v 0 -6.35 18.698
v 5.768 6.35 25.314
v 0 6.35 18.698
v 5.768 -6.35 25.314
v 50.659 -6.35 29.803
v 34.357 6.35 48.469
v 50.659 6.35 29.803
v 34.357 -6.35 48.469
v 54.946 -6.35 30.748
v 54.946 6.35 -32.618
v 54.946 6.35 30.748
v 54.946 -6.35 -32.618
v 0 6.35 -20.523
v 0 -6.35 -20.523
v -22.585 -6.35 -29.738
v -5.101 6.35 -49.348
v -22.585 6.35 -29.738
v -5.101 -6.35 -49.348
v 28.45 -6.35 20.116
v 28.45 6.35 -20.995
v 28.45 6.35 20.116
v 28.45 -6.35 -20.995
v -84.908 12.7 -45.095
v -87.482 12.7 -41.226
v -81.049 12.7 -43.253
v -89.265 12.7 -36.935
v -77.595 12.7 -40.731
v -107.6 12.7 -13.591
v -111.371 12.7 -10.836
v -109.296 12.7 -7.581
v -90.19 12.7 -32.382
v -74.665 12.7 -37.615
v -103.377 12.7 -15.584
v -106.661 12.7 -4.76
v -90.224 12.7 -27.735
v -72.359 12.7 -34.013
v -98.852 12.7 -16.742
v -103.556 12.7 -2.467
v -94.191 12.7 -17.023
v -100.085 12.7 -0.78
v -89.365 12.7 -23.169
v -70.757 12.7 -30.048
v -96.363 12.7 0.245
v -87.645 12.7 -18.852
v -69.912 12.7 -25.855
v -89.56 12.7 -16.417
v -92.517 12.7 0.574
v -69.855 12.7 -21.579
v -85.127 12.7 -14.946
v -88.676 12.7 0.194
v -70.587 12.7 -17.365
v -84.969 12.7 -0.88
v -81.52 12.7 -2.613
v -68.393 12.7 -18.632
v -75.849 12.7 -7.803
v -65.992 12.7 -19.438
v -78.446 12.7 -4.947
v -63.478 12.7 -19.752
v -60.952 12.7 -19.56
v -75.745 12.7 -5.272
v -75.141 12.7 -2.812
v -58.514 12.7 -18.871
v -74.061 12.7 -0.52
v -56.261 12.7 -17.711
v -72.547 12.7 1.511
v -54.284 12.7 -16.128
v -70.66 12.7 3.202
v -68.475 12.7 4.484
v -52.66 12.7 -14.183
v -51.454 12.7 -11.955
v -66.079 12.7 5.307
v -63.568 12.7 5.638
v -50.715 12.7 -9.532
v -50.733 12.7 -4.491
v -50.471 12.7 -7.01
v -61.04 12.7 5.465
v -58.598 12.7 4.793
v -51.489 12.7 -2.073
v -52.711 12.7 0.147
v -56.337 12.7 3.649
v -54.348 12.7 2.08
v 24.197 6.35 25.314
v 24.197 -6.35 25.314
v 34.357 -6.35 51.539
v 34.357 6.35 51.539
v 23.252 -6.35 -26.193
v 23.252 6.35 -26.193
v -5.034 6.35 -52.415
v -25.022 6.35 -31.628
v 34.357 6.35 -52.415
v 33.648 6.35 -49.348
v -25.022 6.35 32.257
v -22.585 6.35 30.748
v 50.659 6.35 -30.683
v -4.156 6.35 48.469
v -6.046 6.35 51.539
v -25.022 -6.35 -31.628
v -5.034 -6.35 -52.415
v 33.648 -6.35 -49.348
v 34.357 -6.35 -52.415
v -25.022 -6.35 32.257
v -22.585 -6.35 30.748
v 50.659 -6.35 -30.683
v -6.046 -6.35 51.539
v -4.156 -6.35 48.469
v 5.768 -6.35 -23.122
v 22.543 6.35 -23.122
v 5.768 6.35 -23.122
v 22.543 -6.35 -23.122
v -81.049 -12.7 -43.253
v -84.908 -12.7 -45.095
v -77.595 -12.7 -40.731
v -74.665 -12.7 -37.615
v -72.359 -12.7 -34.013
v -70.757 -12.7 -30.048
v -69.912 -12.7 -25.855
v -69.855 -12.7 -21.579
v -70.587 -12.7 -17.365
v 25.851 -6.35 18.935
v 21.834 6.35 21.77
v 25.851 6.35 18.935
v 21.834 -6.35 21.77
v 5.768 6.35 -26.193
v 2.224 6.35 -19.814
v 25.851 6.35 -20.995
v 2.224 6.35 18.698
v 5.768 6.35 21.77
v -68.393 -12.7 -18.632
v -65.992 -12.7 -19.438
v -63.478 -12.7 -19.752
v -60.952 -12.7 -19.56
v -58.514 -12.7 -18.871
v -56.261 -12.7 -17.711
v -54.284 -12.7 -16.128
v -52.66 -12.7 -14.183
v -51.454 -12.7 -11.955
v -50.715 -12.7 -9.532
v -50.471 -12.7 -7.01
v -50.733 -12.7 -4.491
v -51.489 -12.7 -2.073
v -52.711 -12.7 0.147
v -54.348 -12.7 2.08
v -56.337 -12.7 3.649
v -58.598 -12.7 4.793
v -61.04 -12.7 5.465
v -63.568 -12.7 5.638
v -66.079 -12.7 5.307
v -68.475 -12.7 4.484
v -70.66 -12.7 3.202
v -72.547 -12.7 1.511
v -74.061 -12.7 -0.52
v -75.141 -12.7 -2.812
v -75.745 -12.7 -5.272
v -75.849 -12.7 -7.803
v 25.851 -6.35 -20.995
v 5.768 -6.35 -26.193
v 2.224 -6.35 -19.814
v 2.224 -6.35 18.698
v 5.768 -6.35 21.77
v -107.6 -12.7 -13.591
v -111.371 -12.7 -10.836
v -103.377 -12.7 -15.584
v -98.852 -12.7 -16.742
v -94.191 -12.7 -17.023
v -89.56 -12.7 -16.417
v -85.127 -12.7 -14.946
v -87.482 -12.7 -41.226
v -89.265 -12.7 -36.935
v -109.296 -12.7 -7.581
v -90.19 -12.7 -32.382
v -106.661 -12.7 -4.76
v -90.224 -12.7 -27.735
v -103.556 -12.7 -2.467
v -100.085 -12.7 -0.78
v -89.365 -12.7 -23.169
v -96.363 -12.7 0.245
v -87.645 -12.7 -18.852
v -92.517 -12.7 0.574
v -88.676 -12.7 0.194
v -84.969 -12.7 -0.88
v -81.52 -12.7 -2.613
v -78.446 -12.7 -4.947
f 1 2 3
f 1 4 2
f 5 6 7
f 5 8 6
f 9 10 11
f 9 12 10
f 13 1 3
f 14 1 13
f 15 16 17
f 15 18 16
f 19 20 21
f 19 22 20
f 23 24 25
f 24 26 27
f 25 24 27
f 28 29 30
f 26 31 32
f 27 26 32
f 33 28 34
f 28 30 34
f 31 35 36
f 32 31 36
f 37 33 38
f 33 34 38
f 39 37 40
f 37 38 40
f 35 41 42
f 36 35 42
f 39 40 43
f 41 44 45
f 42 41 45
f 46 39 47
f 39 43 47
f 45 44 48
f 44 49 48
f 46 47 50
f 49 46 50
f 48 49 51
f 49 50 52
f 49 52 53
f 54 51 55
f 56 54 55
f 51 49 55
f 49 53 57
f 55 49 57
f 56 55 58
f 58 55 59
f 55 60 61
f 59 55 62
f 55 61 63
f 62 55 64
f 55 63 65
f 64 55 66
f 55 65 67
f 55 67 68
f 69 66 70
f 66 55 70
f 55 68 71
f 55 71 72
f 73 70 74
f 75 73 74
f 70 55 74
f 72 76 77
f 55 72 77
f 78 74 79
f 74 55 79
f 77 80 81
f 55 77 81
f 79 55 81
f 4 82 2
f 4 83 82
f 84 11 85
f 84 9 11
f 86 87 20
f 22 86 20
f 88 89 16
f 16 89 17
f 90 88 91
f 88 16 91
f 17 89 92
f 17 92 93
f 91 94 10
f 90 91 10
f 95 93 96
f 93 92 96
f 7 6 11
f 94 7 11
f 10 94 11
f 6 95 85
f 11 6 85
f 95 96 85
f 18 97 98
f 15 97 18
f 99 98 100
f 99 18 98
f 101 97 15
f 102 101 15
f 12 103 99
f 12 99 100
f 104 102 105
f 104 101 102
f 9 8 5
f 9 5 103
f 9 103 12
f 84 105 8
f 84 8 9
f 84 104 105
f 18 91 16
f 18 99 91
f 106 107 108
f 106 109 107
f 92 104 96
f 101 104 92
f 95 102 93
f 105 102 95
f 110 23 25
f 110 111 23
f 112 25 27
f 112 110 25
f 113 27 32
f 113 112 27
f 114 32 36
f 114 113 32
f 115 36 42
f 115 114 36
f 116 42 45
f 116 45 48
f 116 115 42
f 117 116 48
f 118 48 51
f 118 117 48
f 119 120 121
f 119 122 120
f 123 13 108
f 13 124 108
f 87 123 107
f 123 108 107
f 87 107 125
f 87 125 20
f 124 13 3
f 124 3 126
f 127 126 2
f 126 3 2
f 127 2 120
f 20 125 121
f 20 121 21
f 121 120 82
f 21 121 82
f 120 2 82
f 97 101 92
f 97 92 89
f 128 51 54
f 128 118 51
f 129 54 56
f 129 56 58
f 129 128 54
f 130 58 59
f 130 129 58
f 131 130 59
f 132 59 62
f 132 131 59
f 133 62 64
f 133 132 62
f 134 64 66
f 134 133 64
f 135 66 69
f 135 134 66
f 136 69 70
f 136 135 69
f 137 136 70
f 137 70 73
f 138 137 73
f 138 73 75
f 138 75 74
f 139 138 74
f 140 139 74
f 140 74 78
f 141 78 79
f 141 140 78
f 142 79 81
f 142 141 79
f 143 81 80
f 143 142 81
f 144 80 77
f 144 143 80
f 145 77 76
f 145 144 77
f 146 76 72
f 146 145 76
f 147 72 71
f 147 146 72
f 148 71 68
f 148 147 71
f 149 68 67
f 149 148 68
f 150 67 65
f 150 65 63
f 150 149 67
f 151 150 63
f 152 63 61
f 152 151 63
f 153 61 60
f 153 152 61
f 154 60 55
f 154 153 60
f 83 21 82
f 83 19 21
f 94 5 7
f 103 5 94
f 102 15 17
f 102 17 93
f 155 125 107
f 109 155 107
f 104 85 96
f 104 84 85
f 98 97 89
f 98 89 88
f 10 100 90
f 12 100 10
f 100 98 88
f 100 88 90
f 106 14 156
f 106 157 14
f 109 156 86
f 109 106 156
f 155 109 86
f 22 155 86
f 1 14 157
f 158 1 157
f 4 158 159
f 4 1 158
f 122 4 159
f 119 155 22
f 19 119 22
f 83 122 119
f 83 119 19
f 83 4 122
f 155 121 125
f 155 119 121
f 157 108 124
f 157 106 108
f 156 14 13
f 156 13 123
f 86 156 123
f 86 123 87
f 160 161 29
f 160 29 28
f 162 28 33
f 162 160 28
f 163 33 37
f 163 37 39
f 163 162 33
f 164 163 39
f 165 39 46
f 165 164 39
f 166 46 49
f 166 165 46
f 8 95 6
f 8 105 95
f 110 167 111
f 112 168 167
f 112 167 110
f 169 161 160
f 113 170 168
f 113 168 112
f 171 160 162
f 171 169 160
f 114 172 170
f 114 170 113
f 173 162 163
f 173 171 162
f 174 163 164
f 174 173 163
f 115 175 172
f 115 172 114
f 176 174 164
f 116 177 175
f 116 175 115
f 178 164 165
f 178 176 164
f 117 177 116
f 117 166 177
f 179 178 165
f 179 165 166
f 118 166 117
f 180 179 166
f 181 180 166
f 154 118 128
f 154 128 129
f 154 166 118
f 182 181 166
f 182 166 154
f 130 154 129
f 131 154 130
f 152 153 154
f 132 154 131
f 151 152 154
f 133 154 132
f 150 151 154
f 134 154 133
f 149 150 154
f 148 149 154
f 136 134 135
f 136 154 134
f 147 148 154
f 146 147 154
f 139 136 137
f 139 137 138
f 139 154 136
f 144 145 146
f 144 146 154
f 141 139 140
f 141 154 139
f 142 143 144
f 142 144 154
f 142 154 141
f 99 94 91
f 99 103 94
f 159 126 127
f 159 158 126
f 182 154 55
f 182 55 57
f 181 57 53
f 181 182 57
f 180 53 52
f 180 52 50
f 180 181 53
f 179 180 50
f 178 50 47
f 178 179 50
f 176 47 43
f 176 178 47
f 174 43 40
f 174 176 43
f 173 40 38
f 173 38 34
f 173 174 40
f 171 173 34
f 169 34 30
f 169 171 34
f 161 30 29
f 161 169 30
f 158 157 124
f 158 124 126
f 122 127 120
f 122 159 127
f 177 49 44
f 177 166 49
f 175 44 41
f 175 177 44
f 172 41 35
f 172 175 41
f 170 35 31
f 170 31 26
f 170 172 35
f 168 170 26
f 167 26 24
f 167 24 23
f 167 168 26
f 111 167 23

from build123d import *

# Parameters (mm, degrees)
F1_DEPTH = 6.35
F3_DEPTH = 6.35
F5_DEPTH = 12.7


with BuildPart() as f1:
    # F0 (on Front) → F1 (new body, symmetric)
    with BuildSketch(Plane.XZ):
        Polygon((34.3566909432, 51.5392869711), (-6.0458299704, 51.5392869711), (-25.0216538746, 32.2574027531), (-25.0216538746, -31.6276848316), (-5.0335519168, -52.4153076112), (34.3566909432, -52.4153076112), (54.9463386749, -32.6175663062), (54.9463386749, 30.7481326163), align=None)
        Polygon((-22.5848723203, -29.7375079244), (-22.5848723203, 30.7481326163), (-4.1556539945, 48.4685376287), (34.3566909432, 48.4685376287), (50.6594628096, 29.803045094), (50.6594628096, -30.6825973094), (33.6478725076, -49.3480861187), (-5.1007419825, -49.3480861187), align=None, mode=Mode.SUBTRACT)
    extrude(amount=F1_DEPTH, both=True)


with BuildPart() as f3:
    # F0 (on Front) → F3 (new body, symmetric)
    with BuildSketch(Plane.XZ):
        Polygon((5.7677729055, 25.3138765693), (0, 18.6982583255), (0, -20.5228980631), (5.7677729055, -26.193426922), (23.251902312, -26.193426922), (28.4498855472, -20.9954436868), (28.4498855472, 20.1158914715), (24.1969898343, 25.3138765693), align=None)
        Polygon((2.2236907389, -19.8140833527), (2.2236907389, 18.6982583255), (5.7677729055, 21.7697955668), (21.834269166, 21.7697955668), (25.8508939296, 18.9345311373), (25.8508939296, -20.9954436868), (22.543085739, -23.1218915433), (5.7677729055, -23.1218915433), align=None, mode=Mode.SUBTRACT)
    extrude(amount=F3_DEPTH, both=True)


with BuildPart() as f5:
    # F4 (on Front) → F5 (new body, symmetric)
    with BuildSketch(Plane.XZ):
        with BuildLine():
            ThreePointArc((-70.5872171951, -17.365179622), (-57.3786496576, -18.3574782535), (-50.471133399, -7.0553929545))
            ThreePointArc((-50.471133399, -7.0553929545), (-63.5452750609, 5.6390947475), (-75.8490889922, -7.8033514939))
            ThreePointArc((-75.8490889922, -7.8033514939), (-72.6455367951, -12.2691549419), (-70.5872171951, -17.365179622))
        make_face()
        with BuildLine():
            ThreePointArc((-70.5872171951, -17.365179622), (-72.6455367951, -12.2691549419), (-75.8490889922, -7.8033514939))
            ThreePointArc((-75.8490889922, -7.8033514939), (-74.297666733, -13.1783216628), (-70.5872171951, -17.365179622))
        make_face()
        with BuildLine():
            ThreePointArc((-85.127376563, -14.9462799828), (-80.0566259567, -11.9354502468), (-75.8490889922, -7.8033514939))
            ThreePointArc((-75.8490889922, -7.8033514939), (-80.9289877446, -10.8022982704), (-85.127376563, -14.9462799828))
        make_face()
        with BuildLine():
            ThreePointArc((-70.5872171951, -17.365179622), (-74.297666733, -13.1783216628), (-75.8490889922, -7.8033514939))
            ThreePointArc((-75.8490889922, -7.8033514939), (-80.0566259567, -11.9354502468), (-85.127376563, -14.9462799828))
            ThreePointArc((-85.127376563, -14.9462799828), (-90.31966165, -30.0592863686), (-84.9081575871, -45.0951904058))
            ThreePointArc((-84.9081575871, -45.0951904058), (-72.3589466512, -34.013156702), (-70.5872171951, -17.365179622))
        make_face()
        with BuildLine():
            ThreePointArc((-85.127376563, -14.9462799828), (-80.9289877446, -10.8022982704), (-75.8490889922, -7.8033514939))
            ThreePointArc((-75.8490889922, -7.8033514939), (-94.4479506859, 0.4979120726), (-111.3706231117, -10.8357453719))
            ThreePointArc((-111.3706231117, -10.8357453719), (-98.8521762917, -16.7419250046), (-85.127376563, -14.9462799828))
        make_face()
    extrude(amount=F5_DEPTH, both=True)


solid = Compound([f1.part, f3.part, f5.part])
